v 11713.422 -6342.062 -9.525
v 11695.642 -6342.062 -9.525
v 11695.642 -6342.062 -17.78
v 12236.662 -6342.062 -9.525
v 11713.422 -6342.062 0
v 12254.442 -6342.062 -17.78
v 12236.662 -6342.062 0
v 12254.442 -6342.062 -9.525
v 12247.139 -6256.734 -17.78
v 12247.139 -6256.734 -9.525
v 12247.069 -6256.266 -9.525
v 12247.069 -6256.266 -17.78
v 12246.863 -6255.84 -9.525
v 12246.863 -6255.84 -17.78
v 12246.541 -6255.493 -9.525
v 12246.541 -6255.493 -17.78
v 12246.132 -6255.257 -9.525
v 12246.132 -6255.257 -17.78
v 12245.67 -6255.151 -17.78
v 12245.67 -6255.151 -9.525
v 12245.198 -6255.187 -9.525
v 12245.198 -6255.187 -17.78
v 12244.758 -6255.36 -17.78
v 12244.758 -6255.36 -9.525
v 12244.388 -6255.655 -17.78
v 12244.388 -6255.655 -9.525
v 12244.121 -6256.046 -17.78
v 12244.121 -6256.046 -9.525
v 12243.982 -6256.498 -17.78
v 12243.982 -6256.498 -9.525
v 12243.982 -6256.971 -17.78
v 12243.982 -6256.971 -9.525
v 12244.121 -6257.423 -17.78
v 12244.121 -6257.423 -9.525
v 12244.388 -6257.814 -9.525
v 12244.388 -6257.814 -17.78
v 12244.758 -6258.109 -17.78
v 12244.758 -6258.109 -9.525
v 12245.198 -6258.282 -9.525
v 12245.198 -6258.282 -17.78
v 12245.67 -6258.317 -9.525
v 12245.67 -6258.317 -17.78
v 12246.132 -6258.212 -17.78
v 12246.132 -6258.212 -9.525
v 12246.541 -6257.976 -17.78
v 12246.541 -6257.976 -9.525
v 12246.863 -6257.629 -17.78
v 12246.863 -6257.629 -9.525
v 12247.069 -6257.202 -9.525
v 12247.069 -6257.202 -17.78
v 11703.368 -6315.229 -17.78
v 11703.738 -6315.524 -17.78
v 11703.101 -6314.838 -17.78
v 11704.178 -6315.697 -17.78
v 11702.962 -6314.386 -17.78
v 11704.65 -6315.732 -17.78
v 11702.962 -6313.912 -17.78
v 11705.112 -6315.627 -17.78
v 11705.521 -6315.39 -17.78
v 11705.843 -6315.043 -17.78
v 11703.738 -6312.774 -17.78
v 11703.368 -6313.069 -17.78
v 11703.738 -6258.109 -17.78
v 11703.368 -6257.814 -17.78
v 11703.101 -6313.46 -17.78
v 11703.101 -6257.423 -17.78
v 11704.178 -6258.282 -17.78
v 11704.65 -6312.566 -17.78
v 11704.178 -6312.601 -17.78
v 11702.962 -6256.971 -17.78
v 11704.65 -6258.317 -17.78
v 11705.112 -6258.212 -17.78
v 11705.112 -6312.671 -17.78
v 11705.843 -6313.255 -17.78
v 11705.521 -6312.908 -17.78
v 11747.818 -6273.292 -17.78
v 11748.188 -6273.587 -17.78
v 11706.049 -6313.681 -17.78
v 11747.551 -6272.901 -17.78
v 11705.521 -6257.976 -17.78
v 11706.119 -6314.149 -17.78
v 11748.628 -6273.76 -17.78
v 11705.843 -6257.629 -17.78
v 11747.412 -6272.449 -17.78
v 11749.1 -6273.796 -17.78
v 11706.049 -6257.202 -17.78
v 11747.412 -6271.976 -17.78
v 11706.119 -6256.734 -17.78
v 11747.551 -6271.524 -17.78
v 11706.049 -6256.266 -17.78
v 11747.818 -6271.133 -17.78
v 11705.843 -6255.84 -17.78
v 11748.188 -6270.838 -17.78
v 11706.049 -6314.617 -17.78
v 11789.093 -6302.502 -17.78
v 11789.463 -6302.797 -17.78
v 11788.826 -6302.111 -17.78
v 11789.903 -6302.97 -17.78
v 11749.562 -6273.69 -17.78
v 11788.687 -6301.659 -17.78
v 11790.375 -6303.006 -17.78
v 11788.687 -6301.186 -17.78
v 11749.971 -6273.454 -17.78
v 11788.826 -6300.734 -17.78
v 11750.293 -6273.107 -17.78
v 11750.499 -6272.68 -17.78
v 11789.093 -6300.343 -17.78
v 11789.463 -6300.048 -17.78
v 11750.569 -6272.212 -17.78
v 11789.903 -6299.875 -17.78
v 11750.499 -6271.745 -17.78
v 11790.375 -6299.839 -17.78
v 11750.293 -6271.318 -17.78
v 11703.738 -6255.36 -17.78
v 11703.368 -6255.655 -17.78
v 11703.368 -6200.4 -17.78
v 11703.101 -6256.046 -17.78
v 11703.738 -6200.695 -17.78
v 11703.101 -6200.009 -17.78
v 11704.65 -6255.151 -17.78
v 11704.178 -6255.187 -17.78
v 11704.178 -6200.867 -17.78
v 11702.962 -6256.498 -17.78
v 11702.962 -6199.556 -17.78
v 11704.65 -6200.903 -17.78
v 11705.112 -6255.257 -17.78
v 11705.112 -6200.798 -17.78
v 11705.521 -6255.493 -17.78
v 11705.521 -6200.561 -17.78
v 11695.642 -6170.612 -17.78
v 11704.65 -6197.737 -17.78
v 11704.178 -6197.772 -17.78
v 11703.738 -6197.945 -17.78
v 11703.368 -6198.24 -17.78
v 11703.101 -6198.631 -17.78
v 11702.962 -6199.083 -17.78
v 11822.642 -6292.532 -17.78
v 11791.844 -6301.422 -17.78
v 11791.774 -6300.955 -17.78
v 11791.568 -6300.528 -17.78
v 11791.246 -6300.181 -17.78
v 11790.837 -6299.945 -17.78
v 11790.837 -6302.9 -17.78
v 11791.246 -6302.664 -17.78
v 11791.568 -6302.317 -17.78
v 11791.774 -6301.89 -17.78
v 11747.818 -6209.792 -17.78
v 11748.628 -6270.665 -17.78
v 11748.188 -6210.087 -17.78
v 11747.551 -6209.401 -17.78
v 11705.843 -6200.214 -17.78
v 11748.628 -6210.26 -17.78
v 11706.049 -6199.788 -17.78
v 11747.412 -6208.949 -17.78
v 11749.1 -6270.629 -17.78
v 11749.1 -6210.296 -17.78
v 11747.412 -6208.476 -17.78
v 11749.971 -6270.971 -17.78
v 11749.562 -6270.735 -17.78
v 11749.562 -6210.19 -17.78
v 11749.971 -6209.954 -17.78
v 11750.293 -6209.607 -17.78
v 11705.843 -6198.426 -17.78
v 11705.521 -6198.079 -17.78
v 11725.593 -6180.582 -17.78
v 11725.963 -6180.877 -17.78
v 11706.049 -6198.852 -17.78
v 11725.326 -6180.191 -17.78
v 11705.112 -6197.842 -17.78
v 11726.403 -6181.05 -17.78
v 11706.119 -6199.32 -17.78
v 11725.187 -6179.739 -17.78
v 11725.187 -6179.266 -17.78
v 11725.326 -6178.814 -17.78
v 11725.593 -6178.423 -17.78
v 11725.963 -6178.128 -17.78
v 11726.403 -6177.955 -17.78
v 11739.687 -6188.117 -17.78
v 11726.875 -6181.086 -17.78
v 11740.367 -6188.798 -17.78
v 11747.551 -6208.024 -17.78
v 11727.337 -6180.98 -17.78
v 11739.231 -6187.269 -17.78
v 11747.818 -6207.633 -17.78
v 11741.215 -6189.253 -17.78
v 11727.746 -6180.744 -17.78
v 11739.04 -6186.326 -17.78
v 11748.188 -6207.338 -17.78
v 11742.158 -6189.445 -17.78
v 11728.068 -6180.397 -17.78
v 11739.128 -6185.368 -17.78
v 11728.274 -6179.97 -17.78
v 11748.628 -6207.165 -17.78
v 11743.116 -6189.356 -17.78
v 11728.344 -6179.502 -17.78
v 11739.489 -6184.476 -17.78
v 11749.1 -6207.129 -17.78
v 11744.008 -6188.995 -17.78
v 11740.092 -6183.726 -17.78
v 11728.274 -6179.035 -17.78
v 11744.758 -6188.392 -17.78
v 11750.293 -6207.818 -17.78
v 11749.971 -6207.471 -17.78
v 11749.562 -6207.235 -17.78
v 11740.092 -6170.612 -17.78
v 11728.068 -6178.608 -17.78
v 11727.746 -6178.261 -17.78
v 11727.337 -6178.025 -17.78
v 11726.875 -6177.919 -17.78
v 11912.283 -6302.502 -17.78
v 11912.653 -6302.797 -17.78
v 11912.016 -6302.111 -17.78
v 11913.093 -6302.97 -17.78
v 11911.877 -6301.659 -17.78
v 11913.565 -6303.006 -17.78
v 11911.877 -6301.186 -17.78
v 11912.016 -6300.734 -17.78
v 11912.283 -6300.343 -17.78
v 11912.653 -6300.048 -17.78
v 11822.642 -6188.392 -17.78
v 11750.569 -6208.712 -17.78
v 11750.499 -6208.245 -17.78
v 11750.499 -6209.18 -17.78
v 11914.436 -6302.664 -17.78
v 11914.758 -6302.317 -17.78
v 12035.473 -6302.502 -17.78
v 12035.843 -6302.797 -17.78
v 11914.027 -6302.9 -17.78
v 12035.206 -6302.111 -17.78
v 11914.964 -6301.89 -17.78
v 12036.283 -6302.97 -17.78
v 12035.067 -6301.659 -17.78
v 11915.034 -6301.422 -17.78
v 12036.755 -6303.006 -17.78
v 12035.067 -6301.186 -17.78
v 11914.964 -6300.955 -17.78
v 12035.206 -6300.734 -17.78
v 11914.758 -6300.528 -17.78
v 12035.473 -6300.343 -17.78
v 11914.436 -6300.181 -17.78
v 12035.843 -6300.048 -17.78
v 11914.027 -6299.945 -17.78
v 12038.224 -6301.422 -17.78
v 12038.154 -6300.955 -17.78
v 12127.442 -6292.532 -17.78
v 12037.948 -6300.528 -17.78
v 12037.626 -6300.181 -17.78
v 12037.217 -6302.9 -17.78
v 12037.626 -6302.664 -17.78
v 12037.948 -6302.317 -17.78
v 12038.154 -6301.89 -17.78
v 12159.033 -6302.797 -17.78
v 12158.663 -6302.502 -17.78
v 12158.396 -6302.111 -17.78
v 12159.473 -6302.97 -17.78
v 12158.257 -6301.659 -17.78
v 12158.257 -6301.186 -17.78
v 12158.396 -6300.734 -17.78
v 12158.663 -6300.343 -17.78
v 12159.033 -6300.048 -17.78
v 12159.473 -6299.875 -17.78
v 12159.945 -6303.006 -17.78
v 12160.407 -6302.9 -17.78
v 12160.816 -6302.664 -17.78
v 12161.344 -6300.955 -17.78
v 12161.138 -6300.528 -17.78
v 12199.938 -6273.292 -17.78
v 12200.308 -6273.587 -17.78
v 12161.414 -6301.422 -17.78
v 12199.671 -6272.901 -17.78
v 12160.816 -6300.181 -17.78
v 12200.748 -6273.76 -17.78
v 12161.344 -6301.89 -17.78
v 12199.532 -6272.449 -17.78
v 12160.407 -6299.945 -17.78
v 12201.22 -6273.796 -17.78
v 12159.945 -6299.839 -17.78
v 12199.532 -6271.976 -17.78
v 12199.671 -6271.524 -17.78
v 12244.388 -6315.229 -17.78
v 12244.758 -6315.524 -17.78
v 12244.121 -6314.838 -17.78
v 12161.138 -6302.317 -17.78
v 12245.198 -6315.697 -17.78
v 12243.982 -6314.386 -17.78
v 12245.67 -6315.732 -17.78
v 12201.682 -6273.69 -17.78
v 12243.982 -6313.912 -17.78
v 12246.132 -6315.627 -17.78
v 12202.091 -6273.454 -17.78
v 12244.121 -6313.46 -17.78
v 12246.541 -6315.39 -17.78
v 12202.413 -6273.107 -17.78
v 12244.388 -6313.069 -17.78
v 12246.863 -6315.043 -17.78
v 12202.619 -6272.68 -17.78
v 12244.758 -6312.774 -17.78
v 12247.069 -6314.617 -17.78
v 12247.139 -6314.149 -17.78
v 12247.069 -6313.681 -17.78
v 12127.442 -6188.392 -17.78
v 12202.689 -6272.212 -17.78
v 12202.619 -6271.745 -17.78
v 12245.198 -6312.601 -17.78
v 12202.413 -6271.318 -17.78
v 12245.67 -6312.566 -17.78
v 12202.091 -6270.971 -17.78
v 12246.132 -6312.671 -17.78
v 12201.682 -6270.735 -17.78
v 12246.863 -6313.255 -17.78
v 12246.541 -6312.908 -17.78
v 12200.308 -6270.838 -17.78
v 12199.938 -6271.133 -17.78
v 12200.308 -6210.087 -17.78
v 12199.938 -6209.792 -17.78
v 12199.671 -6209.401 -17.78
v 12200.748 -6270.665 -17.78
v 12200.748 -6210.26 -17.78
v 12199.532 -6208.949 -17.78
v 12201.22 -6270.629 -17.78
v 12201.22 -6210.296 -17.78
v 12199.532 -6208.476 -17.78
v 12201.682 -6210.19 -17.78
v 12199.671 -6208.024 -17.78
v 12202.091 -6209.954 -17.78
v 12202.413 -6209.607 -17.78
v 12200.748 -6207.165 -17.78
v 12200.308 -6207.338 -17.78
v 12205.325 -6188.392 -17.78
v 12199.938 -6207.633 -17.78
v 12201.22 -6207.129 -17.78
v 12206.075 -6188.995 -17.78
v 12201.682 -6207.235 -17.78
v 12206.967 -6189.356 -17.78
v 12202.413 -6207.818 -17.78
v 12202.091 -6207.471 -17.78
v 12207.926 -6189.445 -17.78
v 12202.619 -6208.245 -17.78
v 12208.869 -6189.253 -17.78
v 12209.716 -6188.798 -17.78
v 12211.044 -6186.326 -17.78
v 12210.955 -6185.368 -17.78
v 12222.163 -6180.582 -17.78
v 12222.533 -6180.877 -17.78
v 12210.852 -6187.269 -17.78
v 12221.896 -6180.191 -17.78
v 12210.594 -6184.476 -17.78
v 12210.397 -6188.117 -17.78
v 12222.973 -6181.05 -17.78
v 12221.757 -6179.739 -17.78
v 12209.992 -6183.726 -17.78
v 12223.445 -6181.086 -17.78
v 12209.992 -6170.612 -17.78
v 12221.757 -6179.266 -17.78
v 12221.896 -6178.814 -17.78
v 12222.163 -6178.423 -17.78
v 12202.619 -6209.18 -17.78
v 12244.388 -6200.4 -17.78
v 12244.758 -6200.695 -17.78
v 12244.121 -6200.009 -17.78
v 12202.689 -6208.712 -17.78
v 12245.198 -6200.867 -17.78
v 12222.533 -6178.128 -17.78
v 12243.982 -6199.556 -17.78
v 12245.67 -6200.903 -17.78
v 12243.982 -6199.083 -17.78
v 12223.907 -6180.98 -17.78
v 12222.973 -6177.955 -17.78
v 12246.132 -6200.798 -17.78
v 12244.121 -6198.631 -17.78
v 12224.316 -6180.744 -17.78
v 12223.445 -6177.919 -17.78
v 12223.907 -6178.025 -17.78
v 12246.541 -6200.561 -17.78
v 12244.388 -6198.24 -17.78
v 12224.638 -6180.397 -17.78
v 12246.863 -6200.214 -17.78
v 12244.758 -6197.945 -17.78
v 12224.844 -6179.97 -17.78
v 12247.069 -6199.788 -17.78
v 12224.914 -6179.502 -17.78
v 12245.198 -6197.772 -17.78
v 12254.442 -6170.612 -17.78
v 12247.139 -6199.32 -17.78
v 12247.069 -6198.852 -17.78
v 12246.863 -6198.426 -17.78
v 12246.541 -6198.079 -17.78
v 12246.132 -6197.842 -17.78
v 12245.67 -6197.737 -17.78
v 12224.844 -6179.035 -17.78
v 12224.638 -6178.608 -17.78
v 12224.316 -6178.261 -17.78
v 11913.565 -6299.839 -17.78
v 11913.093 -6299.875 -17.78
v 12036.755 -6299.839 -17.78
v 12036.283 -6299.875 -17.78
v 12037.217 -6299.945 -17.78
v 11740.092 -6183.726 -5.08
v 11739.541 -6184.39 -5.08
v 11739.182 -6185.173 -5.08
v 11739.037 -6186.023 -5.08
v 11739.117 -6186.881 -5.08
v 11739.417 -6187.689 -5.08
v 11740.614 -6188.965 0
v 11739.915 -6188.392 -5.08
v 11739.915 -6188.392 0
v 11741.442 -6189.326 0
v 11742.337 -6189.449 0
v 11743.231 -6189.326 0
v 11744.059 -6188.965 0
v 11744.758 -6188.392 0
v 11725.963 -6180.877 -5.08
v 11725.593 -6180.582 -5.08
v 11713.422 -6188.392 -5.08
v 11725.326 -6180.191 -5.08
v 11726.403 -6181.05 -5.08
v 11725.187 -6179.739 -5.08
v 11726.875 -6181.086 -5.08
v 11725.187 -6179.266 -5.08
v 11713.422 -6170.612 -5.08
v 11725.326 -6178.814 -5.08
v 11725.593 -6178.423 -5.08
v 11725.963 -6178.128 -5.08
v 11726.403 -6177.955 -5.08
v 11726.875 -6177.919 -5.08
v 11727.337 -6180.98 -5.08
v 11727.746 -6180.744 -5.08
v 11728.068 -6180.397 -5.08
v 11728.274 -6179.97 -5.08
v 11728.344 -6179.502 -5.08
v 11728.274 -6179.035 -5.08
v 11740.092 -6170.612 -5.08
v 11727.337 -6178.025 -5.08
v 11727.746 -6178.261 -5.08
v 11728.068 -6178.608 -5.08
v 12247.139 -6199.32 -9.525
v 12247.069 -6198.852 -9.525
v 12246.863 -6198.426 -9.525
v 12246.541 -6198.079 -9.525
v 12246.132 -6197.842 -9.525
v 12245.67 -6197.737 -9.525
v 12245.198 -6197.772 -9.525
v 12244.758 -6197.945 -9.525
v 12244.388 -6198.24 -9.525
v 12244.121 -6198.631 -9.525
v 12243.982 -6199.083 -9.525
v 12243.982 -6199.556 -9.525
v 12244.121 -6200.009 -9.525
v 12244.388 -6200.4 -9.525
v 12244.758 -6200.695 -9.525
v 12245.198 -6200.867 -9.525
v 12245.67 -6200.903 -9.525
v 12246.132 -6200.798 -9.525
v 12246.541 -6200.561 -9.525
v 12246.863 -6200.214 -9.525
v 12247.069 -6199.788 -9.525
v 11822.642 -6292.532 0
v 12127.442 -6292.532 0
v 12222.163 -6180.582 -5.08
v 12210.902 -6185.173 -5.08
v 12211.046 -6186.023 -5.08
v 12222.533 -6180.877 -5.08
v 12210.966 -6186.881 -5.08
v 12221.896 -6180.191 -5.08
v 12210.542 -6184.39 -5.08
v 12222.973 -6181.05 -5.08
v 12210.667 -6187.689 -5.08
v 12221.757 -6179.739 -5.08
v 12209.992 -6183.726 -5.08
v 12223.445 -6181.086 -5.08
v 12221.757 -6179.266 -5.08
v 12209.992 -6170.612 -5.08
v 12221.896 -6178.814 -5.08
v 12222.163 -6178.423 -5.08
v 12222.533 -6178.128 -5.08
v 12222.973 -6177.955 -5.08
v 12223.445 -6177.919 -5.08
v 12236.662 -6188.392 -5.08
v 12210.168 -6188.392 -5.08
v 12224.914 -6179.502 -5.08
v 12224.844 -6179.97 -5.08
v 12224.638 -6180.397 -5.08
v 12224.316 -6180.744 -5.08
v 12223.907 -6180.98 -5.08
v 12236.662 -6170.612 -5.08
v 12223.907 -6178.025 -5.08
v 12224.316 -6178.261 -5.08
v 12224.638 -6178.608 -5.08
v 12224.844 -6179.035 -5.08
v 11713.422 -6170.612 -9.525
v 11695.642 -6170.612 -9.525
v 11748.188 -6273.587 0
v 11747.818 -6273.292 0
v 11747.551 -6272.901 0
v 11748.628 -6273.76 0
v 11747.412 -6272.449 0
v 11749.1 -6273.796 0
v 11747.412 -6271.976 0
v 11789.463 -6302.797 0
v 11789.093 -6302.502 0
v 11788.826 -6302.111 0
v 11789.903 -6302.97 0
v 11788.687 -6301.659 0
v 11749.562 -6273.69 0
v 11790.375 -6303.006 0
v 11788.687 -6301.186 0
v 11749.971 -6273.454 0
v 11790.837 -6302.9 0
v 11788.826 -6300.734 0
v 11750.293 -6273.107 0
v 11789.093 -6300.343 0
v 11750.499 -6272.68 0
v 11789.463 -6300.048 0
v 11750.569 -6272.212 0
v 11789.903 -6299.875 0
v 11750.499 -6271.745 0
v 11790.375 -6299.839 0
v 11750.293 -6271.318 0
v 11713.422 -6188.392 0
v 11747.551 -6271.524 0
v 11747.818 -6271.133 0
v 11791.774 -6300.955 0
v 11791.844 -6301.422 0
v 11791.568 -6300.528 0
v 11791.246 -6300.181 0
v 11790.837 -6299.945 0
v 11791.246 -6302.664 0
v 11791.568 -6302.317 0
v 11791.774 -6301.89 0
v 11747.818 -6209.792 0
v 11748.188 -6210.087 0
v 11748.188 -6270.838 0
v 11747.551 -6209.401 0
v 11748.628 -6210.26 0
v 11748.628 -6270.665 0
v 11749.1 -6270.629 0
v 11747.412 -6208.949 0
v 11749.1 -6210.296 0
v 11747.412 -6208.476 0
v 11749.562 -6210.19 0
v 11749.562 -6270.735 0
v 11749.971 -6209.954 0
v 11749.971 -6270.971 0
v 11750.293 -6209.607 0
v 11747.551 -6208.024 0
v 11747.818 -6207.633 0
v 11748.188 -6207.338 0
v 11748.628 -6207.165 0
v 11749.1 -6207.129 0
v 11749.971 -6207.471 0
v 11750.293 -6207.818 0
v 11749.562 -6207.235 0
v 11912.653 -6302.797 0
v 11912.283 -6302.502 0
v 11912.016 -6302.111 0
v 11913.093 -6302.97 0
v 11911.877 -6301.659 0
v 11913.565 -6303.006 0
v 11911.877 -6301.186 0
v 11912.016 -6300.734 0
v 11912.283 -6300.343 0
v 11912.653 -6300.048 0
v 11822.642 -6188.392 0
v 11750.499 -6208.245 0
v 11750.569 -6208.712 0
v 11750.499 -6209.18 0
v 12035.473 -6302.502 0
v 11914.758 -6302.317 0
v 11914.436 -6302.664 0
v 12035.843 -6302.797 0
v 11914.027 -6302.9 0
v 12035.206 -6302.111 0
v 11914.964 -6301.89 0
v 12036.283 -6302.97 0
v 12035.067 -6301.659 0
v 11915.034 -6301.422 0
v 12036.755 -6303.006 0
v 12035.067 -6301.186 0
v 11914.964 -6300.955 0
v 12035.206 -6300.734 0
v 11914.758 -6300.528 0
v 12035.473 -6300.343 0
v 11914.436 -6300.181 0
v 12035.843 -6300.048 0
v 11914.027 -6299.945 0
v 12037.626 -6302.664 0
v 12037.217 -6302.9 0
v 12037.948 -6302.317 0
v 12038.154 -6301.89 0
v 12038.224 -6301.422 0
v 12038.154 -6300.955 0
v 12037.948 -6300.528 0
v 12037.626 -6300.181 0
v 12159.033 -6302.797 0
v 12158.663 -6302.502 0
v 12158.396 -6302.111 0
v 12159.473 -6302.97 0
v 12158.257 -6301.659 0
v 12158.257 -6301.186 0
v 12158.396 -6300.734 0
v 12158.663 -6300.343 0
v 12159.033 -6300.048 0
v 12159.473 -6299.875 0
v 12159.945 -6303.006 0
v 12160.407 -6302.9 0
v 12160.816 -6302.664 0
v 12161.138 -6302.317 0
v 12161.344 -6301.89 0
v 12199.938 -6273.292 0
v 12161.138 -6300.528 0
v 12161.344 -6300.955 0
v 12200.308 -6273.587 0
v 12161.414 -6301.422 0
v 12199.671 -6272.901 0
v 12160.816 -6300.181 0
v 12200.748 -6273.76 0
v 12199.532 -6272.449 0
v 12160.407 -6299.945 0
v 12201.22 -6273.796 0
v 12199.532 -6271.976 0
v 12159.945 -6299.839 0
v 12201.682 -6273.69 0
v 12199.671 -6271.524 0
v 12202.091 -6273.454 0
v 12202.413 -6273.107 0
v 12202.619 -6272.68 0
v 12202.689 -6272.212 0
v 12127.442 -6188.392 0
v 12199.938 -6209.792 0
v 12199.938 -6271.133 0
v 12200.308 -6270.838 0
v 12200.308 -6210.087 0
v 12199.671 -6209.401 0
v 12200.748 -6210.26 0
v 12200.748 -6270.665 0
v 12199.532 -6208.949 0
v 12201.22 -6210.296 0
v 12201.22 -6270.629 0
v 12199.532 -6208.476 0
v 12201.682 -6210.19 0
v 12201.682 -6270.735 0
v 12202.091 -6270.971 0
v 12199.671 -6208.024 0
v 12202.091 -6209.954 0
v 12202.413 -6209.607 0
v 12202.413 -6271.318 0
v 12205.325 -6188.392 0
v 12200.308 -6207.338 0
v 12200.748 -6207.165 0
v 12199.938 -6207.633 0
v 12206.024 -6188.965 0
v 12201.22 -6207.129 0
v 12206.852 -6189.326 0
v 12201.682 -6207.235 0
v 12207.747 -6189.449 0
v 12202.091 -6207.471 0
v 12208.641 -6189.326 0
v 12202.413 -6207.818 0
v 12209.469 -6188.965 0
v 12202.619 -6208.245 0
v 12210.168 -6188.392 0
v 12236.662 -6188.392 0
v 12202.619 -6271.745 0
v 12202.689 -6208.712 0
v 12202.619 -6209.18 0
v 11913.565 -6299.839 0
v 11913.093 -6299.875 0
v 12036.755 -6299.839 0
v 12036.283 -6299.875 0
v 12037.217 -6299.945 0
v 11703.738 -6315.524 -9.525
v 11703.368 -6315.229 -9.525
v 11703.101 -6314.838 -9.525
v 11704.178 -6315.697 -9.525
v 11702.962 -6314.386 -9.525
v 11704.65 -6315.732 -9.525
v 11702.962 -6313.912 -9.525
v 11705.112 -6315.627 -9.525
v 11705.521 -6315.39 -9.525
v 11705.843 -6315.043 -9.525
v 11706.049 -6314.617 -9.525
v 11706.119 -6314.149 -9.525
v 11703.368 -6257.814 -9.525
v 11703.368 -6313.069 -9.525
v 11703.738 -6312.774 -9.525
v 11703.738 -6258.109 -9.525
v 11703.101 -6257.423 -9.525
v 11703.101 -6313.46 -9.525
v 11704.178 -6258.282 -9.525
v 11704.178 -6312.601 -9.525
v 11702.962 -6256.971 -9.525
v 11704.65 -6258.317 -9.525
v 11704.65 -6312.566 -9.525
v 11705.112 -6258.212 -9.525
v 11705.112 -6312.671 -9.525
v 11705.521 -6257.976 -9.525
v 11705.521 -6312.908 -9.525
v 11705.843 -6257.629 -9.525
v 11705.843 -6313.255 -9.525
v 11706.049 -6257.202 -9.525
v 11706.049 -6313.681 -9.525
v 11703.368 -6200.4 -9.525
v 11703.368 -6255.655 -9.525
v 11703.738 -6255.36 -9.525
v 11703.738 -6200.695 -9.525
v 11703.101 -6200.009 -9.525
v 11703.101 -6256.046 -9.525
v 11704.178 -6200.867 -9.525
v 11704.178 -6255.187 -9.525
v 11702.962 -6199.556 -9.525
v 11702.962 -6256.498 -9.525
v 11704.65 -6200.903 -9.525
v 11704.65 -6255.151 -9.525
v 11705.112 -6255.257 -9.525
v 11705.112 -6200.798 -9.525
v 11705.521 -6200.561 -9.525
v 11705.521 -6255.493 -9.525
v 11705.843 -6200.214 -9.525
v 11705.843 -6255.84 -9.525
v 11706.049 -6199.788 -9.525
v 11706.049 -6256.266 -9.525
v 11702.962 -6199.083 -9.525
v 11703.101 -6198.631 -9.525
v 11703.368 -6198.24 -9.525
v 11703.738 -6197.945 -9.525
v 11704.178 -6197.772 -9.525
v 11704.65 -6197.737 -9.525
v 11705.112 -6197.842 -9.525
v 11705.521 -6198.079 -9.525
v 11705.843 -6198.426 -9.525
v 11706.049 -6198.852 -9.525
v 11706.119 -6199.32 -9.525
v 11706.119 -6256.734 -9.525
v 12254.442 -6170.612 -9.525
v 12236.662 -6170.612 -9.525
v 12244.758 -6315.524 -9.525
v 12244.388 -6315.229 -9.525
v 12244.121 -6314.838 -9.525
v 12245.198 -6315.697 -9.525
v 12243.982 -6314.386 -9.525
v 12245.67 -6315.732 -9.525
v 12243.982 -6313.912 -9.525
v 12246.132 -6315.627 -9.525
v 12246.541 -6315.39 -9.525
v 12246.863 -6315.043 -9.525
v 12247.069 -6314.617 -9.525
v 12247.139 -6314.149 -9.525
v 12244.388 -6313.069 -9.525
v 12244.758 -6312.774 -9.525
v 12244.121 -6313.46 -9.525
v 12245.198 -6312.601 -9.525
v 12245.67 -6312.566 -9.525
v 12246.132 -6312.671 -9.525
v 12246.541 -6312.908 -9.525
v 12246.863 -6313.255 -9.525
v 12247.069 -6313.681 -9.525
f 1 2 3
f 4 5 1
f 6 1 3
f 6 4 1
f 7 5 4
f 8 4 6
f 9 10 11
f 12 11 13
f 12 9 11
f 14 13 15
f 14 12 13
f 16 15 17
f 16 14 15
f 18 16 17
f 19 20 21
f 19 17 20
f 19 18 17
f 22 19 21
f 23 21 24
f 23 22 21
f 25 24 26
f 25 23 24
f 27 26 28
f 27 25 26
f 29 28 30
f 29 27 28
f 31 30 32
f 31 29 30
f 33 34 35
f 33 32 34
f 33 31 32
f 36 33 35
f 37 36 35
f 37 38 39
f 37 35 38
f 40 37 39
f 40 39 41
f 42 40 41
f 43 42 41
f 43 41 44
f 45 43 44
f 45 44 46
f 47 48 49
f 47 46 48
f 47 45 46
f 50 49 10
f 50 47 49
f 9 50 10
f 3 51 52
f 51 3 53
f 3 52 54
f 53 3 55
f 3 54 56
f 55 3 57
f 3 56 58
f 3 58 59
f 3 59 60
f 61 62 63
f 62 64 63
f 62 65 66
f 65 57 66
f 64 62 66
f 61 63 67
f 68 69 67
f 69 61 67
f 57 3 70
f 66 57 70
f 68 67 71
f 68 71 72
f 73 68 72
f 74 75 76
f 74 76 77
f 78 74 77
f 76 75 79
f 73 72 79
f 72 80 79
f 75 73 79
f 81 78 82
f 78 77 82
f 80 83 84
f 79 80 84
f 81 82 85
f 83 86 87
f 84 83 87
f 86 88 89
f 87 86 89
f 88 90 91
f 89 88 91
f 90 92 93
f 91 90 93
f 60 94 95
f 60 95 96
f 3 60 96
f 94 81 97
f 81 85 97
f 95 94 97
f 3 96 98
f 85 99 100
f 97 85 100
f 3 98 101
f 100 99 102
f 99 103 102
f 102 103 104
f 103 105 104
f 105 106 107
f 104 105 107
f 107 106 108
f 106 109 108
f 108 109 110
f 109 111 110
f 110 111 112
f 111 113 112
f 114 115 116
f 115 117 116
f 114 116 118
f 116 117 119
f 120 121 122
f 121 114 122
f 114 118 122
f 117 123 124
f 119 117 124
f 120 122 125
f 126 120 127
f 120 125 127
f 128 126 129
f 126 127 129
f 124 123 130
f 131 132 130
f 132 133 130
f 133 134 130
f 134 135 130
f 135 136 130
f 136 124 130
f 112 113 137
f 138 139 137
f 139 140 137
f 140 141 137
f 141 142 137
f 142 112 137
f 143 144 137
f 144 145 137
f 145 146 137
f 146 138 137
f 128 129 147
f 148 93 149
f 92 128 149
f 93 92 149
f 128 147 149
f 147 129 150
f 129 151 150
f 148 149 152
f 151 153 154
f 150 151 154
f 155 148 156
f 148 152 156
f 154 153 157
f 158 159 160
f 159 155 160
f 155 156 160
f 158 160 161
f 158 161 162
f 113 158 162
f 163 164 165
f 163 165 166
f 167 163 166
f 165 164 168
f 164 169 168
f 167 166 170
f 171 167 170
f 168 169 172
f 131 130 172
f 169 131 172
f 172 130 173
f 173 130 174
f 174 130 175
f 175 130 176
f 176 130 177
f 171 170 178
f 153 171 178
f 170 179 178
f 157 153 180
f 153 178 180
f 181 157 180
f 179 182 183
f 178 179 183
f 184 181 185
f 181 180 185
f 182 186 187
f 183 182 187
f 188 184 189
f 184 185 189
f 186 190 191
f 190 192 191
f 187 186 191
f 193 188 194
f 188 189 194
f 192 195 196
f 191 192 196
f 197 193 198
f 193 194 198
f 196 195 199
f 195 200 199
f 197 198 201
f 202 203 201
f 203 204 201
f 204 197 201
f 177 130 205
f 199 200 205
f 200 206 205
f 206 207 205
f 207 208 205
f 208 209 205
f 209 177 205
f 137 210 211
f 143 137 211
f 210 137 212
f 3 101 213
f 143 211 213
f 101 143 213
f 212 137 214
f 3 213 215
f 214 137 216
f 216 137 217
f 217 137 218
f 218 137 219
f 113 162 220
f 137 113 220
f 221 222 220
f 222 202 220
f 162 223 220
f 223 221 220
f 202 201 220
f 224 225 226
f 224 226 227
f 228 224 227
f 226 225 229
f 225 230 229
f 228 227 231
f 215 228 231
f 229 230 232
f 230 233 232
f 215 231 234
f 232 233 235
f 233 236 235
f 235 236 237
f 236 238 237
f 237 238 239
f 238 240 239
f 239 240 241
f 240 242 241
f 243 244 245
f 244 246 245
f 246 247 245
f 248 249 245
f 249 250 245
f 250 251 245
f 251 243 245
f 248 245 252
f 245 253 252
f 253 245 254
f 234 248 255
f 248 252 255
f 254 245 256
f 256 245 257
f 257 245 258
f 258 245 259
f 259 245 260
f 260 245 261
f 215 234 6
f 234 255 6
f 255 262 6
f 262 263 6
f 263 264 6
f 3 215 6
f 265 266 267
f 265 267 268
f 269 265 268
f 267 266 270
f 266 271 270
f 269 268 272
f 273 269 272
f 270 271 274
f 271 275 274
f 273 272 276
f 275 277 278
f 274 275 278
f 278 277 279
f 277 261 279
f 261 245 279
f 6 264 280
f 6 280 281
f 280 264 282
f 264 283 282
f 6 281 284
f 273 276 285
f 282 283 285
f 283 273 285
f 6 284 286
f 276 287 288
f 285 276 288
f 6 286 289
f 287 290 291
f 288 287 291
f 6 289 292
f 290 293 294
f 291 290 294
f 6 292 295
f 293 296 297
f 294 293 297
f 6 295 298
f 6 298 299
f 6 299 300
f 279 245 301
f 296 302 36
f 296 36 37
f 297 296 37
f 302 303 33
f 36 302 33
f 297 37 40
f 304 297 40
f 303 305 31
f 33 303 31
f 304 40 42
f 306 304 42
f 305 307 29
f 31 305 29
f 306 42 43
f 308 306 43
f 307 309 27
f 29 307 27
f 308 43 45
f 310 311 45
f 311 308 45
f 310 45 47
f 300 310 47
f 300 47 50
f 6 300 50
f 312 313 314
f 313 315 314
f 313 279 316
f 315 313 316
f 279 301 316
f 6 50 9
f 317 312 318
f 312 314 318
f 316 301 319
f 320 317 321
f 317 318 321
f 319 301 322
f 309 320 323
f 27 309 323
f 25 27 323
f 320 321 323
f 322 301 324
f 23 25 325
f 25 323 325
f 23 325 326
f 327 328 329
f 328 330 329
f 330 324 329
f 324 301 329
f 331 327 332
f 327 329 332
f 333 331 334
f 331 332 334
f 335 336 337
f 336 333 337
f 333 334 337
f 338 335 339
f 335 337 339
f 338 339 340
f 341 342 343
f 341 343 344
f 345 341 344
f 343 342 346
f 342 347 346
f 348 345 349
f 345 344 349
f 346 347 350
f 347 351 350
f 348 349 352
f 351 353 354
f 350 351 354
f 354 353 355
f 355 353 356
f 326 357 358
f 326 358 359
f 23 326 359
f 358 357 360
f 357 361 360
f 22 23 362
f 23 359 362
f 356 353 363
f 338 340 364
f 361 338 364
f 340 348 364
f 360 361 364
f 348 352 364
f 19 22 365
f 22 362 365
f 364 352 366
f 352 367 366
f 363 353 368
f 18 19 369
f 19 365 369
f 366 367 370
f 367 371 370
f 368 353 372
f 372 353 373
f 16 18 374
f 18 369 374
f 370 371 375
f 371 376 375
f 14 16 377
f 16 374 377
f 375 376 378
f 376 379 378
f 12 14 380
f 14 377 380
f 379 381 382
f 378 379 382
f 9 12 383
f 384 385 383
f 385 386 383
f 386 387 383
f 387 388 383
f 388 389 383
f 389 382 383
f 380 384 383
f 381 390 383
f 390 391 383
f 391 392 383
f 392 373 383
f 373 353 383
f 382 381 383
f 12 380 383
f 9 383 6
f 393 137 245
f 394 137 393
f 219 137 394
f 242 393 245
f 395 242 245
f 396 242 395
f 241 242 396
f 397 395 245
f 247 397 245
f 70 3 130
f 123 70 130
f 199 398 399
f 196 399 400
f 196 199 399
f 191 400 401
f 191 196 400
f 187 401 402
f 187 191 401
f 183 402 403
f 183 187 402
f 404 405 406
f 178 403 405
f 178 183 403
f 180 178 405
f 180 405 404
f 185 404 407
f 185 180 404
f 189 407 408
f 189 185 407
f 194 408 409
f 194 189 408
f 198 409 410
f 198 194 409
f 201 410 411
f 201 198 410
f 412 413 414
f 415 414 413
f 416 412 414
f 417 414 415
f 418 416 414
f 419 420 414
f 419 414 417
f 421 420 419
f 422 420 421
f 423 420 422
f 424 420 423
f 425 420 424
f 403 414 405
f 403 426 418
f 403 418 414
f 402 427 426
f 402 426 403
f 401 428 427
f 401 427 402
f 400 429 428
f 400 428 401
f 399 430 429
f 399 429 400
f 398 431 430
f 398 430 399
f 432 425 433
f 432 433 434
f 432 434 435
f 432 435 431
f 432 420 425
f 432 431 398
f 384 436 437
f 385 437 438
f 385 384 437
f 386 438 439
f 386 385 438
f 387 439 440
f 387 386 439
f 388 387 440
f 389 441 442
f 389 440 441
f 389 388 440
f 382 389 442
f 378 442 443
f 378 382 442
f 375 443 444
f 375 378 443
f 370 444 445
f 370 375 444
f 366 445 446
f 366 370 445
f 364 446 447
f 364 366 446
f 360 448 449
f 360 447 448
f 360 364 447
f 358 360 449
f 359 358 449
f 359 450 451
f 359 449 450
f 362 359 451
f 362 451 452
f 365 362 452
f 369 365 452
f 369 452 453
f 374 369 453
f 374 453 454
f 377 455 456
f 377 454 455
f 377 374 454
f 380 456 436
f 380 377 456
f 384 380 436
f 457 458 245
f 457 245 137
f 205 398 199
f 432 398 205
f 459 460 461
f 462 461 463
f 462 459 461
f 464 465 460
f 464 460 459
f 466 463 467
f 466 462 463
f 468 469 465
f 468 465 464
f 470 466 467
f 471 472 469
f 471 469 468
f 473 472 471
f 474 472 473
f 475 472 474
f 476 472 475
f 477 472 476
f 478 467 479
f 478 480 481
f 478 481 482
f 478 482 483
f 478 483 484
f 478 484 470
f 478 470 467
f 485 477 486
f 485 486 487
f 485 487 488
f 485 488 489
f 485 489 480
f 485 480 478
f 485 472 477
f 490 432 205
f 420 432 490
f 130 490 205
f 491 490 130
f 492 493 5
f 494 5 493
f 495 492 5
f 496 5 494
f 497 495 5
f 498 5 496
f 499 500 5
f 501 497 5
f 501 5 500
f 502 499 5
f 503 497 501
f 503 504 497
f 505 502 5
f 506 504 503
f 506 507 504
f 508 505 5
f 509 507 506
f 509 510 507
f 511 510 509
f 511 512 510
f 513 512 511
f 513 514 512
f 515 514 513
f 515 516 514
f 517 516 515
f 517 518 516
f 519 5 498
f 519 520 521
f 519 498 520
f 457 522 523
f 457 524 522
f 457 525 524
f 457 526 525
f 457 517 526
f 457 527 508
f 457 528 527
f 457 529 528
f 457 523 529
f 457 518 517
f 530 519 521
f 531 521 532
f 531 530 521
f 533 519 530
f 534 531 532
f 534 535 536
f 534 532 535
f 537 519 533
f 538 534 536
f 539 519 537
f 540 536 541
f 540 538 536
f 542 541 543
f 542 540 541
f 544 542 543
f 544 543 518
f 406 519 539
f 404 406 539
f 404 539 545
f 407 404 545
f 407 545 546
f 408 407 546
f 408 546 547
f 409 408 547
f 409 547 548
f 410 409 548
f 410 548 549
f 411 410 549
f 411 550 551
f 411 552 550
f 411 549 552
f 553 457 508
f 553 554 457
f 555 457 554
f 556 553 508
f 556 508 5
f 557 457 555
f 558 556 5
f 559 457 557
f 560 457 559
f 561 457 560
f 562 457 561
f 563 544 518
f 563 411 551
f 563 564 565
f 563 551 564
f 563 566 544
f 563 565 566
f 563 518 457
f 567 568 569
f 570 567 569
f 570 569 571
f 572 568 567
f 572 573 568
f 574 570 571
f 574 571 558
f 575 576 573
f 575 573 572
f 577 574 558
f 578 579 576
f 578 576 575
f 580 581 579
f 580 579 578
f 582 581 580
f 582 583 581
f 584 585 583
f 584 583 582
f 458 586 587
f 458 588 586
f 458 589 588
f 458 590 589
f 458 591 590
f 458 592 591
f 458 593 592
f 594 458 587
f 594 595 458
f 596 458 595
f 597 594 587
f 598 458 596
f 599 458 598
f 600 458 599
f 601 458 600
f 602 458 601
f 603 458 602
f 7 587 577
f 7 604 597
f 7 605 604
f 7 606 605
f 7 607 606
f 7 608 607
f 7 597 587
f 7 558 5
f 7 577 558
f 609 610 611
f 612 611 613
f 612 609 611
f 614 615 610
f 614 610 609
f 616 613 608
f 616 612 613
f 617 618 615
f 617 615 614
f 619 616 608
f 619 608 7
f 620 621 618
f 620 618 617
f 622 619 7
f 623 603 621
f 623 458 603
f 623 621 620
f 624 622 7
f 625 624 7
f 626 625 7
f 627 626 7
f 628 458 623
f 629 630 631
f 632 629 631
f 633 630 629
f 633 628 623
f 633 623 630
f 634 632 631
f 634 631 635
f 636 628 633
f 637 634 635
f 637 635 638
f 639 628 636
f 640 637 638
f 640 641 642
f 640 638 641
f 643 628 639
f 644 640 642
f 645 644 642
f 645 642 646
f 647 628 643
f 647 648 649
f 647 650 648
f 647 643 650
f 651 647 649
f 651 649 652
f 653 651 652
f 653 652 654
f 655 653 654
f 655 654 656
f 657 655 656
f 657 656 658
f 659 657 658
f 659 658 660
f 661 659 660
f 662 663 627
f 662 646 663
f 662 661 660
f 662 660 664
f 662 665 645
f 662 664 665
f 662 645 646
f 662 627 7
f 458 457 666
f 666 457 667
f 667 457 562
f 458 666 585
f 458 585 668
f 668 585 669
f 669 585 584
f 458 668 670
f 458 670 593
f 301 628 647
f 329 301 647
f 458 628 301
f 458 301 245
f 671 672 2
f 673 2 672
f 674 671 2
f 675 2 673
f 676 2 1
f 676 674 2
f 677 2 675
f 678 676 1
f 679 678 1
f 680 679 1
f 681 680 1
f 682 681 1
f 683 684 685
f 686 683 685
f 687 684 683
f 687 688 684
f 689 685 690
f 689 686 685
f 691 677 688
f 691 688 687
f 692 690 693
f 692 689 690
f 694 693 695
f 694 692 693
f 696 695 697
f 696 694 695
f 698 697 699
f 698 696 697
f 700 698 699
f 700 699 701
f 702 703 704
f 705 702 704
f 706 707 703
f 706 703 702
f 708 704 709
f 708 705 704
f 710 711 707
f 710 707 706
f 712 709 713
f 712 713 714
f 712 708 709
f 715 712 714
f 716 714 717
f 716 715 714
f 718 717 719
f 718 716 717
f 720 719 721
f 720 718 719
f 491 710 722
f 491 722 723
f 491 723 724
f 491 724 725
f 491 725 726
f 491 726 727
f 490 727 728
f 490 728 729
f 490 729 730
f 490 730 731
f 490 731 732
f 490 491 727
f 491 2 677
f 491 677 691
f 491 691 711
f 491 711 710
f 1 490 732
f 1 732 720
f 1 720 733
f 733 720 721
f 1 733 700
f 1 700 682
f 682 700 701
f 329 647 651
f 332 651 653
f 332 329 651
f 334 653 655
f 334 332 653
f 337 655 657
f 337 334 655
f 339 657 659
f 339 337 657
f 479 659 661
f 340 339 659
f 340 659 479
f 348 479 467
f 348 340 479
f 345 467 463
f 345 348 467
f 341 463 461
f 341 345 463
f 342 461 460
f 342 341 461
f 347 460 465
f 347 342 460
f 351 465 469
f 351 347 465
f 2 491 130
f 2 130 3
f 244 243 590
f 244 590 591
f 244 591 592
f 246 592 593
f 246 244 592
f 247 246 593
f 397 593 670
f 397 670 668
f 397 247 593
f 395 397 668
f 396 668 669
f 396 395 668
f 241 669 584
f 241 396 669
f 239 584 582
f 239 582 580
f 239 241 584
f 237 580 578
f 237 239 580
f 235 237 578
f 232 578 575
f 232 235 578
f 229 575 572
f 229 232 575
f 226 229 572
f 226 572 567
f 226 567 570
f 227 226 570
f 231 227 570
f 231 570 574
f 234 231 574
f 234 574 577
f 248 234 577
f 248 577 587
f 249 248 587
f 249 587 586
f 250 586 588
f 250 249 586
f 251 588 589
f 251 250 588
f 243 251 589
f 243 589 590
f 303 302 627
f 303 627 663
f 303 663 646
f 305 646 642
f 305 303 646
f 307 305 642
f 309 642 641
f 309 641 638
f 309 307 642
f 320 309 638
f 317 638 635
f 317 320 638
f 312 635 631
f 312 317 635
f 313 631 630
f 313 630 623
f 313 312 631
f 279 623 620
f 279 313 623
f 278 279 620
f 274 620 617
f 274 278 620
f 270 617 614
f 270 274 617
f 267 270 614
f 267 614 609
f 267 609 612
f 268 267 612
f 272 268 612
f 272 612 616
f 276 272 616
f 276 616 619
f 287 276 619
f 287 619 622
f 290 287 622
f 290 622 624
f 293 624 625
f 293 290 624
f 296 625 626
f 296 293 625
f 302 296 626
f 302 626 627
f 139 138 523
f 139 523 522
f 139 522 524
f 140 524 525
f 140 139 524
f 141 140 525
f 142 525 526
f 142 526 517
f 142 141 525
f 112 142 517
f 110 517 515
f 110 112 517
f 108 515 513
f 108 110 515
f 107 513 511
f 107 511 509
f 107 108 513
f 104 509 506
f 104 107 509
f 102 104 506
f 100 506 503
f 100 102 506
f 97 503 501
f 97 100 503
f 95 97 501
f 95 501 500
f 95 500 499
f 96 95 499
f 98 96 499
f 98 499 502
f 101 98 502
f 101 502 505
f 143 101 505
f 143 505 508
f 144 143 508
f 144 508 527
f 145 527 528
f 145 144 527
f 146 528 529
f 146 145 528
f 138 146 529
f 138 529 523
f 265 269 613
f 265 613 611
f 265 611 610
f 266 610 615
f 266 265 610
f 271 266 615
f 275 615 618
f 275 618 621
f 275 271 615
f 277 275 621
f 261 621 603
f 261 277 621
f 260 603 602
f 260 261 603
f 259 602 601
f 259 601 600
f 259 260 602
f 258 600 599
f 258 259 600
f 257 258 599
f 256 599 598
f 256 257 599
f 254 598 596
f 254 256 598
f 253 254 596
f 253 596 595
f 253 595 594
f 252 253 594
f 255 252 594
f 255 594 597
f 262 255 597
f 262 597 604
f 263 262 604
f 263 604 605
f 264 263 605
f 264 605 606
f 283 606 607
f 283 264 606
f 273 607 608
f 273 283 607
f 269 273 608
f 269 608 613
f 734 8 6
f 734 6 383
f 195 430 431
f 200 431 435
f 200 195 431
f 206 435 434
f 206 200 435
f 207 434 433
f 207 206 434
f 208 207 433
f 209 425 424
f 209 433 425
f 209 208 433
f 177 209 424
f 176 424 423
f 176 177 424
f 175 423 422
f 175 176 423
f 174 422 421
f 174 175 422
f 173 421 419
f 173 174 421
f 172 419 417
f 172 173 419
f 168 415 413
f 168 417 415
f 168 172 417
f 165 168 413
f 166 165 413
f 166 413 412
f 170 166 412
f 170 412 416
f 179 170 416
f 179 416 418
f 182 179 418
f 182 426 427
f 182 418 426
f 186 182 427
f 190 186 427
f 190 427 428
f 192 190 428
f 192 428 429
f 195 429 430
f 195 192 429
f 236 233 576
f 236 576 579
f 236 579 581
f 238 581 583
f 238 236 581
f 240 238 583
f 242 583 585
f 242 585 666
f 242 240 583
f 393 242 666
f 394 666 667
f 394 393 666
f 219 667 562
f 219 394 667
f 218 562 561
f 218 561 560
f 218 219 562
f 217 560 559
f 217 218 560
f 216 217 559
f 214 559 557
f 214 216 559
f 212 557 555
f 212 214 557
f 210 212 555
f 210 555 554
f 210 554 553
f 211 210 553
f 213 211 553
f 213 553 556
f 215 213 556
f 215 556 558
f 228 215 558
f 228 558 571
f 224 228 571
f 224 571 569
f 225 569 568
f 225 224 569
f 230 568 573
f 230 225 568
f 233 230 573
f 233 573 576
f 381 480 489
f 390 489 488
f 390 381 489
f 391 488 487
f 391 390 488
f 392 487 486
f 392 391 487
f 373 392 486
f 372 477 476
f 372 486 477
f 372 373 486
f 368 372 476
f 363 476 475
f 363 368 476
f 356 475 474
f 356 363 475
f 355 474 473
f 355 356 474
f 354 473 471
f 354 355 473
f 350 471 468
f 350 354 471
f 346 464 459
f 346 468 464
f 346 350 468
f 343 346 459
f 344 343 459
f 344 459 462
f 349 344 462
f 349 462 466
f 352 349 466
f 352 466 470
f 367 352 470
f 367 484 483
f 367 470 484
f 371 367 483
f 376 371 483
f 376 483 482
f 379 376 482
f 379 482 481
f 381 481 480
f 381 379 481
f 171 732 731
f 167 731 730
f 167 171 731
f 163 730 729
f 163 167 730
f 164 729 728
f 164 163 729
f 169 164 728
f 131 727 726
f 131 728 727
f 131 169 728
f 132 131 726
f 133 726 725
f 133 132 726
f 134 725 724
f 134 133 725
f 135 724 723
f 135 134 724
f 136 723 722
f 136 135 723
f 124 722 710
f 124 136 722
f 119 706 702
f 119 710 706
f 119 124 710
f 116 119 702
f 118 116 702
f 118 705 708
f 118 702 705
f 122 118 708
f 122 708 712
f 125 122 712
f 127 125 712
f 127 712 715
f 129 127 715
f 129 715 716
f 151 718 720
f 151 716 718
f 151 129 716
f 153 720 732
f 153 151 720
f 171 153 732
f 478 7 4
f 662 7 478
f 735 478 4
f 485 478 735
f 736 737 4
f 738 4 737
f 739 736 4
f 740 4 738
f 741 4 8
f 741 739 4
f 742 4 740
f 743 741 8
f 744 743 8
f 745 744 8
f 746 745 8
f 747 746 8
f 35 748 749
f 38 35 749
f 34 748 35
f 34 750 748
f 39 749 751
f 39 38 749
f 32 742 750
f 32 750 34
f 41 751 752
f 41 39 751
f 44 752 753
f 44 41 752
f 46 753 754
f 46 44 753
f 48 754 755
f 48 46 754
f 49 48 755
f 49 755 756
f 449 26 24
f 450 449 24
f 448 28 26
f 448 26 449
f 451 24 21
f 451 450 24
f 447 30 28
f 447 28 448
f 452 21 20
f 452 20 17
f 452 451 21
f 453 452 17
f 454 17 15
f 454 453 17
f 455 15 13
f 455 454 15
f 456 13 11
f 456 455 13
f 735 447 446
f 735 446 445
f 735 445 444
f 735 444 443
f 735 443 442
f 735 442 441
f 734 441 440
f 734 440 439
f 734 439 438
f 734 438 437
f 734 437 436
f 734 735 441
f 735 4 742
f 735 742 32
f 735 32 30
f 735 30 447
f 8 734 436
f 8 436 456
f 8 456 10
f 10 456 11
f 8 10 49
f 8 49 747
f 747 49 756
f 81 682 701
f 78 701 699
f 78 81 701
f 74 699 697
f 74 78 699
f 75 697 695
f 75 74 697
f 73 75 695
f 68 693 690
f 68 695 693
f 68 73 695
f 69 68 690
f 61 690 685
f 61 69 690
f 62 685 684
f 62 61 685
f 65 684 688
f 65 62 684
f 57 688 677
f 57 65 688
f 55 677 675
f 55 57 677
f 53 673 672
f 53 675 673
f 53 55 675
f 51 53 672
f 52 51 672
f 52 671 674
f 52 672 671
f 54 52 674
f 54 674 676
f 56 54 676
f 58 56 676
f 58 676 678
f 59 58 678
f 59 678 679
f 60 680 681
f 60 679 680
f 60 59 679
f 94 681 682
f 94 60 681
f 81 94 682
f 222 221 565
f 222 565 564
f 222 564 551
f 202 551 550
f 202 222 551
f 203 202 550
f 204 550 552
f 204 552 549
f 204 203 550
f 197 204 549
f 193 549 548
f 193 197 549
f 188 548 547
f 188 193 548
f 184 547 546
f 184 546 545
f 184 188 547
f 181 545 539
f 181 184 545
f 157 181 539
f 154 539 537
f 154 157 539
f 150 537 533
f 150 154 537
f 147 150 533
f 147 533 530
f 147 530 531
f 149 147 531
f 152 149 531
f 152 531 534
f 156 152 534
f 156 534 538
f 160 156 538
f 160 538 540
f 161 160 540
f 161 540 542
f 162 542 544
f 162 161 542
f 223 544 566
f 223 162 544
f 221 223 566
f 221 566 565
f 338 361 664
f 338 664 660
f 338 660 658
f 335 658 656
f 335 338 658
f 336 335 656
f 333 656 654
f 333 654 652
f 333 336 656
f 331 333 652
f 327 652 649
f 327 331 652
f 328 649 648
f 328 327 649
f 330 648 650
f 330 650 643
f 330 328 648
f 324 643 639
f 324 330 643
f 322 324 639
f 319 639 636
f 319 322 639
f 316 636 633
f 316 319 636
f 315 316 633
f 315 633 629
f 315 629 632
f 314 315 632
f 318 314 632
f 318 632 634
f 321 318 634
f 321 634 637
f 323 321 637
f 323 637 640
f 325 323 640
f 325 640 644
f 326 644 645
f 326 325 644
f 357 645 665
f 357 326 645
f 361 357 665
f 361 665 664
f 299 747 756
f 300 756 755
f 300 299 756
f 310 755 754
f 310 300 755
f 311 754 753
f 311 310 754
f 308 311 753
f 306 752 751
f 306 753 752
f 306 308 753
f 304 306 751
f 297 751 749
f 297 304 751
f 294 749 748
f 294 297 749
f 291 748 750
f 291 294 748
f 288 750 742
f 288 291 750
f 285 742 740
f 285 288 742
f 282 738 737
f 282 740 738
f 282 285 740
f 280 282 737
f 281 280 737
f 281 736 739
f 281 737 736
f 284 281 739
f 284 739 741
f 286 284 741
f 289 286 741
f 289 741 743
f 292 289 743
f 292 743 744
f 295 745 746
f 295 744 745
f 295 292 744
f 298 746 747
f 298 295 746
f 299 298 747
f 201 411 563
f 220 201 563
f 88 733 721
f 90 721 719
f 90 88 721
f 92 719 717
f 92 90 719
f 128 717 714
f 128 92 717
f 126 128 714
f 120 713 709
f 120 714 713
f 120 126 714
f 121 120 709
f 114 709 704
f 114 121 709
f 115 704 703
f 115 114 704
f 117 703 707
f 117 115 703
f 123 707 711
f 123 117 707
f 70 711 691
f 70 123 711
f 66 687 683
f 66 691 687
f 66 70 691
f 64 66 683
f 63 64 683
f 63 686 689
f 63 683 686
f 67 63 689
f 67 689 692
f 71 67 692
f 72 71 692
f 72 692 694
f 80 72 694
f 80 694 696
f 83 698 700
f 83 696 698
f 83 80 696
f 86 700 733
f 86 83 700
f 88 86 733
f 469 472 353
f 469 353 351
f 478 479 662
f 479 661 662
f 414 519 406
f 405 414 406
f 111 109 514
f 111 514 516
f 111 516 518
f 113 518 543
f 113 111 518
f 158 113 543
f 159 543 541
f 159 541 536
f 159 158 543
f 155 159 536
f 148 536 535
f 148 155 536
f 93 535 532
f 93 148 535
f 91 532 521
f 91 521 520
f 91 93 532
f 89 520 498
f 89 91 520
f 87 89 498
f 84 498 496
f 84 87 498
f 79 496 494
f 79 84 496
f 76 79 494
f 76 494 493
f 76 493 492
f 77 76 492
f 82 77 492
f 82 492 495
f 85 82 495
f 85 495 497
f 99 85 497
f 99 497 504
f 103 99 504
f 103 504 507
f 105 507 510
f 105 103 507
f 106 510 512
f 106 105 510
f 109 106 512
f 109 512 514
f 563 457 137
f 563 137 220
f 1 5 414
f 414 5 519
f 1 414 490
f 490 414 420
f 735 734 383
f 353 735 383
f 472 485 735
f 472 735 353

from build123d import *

# Parameters (mm, degrees)
EXTRUDE1_DEPTH     = 17.78
SKETCH3_W          = 44.45
SKETCH3_H          = 17.78
CUT_EXTRUDE1_DEPTH = 5.08
SKETCH4_W          = 17.78
SKETCH4_H          = 171.45
CUT_EXTRUDE2_DEPTH = 9.525
CUT_EXTRUDE3_START = -17.78
SKETCH5_R          = 1.5875
SKETCH5_R_2        = 3.302
CUT_EXTRUDE3_DEPTH = 17.78


with BuildPart() as part:
    # Sketch2 → Extrude1 (new body)
    with BuildSketch(Plane.XY):
        Polygon((12254.441666666, -6342.0625), (12254.441666666, -6170.6125), (12209.991666666, -6170.6125), (12209.991666666, -6188.3925), (12127.441666666, -6188.3925), (12127.441666666, -6292.5325), (11822.641666666, -6292.5325), (11822.641666666, -6188.3925), (11740.091666666, -6188.3925), (11740.091666666, -6170.6125), (11695.641666666, -6170.6125), (11695.641666666, -6342.0625), align=None)
    extrude(amount=-EXTRUDE1_DEPTH)

    # Sketch3 → Cut-Extrude1 (cut)
    with BuildSketch(Plane.XY):
        with Locations((11717.866666666, -6179.5025)):
            Rectangle(SKETCH3_W, SKETCH3_H)
        with Locations((12232.216666666, -6179.5025)):
            Rectangle(SKETCH3_W, SKETCH3_H)
    extrude(amount=-CUT_EXTRUDE1_DEPTH, mode=Mode.SUBTRACT)

    # Sketch4 → Cut-Extrude2 (cut)
    with BuildSketch(Plane.XY):
        with Locations((11704.531666666, -6256.3375)):
            Rectangle(SKETCH4_W, SKETCH4_H)
        with Locations((12245.551666666, -6256.3375)):
            Rectangle(SKETCH4_W, SKETCH4_H)
    extrude(amount=-CUT_EXTRUDE2_DEPTH, mode=Mode.SUBTRACT)

    # Sketch5 → Cut-Extrude3 (cut)
    with BuildSketch(Plane.XY.offset(CUT_EXTRUDE3_START)):
        with Locations((11704.531666666, -6314.148958334)):
            Circle(SKETCH5_R)
        with Locations((11704.531666666, -6256.734375)):
            Circle(SKETCH5_R)
        with Locations((11704.531666666, -6199.319791666)):
            Circle(SKETCH5_R)
        with Locations((11726.756666666, -6179.5025)):
            Circle(SKETCH5_R)
        with Locations((11748.981666666, -6208.7125)):
            Circle(SKETCH5_R)
        with Locations((11748.981666666, -6272.2125)):
            Circle(SKETCH5_R)
        with Locations((11790.256666666, -6301.4225)):
            Circle(SKETCH5_R)
        with Locations((11913.446666666, -6301.4225)):
            Circle(SKETCH5_R)
        with Locations((12036.636666666, -6301.4225)):
            Circle(SKETCH5_R)
        with Locations((12159.826666666, -6301.4225)):
            Circle(SKETCH5_R)
        with Locations((12245.551666666, -6314.148958334)):
            Circle(SKETCH5_R)
        with Locations((12245.551666666, -6256.734375)):
            Circle(SKETCH5_R)
        with Locations((12201.101666666, -6272.2125)):
            Circle(SKETCH5_R)
        with Locations((12201.101666666, -6208.7125)):
            Circle(SKETCH5_R)
        with Locations((12245.551666666, -6199.319791666)):
            Circle(SKETCH5_R)
        with Locations((12223.326666666, -6179.5025)):
            Circle(SKETCH5_R)
        with Locations((11742.336730696, -6186.14743597)):
            Circle(SKETCH5_R_2)
        with Locations((12207.746602636, -6186.14743597)):
            Circle(SKETCH5_R_2)
    extrude(amount=CUT_EXTRUDE3_DEPTH, mode=Mode.SUBTRACT)


solid = part.part
